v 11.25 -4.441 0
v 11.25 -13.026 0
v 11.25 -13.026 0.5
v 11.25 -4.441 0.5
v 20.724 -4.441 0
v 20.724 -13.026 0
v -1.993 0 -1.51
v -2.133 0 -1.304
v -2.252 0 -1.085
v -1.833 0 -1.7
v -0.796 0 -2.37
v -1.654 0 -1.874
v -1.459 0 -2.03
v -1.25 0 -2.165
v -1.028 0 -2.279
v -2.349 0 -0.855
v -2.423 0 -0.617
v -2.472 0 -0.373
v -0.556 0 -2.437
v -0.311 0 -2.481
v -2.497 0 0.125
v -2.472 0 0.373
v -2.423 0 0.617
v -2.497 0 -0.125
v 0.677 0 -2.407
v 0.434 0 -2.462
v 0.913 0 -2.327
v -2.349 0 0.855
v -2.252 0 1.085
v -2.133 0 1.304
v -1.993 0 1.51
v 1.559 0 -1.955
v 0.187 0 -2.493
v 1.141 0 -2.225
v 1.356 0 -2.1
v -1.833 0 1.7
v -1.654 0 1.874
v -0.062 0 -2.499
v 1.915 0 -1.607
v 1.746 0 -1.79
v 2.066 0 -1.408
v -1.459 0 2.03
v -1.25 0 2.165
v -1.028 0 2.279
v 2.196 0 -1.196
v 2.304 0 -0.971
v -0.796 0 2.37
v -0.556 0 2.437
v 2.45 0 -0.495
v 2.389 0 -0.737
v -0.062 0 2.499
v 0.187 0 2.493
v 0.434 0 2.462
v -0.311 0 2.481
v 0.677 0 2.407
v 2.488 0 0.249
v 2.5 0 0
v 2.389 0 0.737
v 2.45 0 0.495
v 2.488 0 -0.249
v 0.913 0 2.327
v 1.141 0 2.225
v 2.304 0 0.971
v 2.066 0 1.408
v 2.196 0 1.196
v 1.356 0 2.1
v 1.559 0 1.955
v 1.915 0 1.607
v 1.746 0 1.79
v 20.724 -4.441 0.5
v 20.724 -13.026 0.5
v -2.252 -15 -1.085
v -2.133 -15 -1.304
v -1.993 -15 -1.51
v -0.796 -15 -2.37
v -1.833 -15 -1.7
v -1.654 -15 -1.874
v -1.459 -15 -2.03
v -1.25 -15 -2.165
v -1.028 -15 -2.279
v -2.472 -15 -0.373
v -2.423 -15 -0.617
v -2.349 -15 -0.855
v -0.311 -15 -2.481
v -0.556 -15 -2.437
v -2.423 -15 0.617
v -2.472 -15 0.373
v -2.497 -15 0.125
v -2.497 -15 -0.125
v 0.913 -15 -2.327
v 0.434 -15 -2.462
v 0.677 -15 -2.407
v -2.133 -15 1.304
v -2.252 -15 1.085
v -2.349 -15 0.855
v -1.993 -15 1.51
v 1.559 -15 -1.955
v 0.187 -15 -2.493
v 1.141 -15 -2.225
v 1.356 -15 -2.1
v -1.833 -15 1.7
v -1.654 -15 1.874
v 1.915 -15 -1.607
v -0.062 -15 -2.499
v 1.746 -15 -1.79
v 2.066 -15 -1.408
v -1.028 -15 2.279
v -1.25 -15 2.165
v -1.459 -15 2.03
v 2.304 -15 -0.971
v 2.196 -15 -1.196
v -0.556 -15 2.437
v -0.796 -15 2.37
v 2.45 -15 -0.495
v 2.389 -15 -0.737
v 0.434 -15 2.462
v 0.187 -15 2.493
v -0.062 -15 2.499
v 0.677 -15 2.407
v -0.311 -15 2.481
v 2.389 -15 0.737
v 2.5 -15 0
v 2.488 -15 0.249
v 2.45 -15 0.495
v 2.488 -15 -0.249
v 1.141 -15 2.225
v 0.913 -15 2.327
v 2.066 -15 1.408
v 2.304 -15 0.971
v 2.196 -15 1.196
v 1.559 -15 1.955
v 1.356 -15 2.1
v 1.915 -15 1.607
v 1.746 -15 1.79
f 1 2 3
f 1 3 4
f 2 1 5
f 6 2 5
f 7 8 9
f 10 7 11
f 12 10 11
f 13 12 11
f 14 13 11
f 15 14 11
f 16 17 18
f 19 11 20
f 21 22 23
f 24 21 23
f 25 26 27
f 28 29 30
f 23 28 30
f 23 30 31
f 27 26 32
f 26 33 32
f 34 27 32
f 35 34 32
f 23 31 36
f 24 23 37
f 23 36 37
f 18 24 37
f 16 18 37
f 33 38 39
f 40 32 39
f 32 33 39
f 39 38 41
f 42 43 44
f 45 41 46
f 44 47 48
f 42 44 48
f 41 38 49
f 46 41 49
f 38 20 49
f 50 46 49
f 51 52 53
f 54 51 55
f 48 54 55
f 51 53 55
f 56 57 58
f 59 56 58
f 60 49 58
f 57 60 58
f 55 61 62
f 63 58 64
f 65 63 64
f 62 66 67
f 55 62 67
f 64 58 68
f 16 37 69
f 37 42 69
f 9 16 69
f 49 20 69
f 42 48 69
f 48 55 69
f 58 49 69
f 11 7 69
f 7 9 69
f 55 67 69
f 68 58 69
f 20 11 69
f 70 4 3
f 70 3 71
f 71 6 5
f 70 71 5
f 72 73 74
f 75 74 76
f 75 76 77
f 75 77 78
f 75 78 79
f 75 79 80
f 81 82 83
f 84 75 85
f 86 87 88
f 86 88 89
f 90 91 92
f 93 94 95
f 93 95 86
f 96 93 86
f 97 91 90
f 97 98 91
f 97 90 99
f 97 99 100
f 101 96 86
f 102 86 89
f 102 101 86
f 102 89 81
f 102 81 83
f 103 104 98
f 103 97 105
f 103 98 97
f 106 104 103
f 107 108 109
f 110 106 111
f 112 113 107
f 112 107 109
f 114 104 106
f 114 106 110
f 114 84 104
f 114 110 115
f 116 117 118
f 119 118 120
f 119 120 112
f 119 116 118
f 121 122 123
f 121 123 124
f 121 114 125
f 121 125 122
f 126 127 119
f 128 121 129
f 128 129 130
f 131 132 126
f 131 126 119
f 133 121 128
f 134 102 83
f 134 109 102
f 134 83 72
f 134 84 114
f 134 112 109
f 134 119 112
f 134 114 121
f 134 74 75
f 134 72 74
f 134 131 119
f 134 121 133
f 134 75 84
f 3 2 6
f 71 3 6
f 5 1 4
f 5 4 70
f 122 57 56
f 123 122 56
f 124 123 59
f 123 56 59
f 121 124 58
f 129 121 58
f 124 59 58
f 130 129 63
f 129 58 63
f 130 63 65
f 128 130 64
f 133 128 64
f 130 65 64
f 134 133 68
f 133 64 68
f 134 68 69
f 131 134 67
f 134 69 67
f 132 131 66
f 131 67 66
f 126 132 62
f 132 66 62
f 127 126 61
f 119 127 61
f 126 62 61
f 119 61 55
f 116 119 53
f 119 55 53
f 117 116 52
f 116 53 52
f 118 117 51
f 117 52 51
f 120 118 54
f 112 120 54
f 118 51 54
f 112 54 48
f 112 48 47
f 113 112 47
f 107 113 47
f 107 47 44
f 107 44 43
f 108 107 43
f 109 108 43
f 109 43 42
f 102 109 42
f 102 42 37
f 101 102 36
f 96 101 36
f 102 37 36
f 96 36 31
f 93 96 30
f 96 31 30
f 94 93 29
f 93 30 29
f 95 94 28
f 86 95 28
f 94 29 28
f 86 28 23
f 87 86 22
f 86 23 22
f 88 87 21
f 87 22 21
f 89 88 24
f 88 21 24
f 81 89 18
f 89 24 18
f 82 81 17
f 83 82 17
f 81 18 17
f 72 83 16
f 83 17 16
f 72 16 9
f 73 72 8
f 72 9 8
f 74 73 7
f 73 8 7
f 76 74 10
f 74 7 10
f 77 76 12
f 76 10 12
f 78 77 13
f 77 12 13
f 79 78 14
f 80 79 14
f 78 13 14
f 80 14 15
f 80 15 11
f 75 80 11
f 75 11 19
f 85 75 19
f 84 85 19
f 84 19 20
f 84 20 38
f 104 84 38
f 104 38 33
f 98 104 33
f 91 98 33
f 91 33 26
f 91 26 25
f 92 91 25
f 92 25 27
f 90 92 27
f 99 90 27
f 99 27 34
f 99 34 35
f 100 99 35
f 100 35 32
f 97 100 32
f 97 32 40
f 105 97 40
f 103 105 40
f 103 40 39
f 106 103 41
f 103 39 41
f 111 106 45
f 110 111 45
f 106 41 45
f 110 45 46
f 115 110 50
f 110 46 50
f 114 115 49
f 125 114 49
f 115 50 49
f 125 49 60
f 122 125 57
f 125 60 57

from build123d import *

# Parameters (mm, degrees)
F0_R     = 2.5
F1_DEPTH = 15
F2_W     = 9.473683
F2_H     = 8.585526
F3_DEPTH = 0.5


with BuildPart() as f1:
    # F0 (on Front) → F1 (new body)
    with BuildSketch(Plane.XZ):
        Circle(F0_R)
    extrude(amount=F1_DEPTH)


with BuildPart() as f3:
    # F2 (on Top) → F3 (new body)
    with BuildSketch(Plane.XY):
        with Locations((15.986842, -8.733553)):
            Rectangle(F2_W, F2_H)
    extrude(amount=F3_DEPTH)


solid = Compound([f1.part, f3.part])
